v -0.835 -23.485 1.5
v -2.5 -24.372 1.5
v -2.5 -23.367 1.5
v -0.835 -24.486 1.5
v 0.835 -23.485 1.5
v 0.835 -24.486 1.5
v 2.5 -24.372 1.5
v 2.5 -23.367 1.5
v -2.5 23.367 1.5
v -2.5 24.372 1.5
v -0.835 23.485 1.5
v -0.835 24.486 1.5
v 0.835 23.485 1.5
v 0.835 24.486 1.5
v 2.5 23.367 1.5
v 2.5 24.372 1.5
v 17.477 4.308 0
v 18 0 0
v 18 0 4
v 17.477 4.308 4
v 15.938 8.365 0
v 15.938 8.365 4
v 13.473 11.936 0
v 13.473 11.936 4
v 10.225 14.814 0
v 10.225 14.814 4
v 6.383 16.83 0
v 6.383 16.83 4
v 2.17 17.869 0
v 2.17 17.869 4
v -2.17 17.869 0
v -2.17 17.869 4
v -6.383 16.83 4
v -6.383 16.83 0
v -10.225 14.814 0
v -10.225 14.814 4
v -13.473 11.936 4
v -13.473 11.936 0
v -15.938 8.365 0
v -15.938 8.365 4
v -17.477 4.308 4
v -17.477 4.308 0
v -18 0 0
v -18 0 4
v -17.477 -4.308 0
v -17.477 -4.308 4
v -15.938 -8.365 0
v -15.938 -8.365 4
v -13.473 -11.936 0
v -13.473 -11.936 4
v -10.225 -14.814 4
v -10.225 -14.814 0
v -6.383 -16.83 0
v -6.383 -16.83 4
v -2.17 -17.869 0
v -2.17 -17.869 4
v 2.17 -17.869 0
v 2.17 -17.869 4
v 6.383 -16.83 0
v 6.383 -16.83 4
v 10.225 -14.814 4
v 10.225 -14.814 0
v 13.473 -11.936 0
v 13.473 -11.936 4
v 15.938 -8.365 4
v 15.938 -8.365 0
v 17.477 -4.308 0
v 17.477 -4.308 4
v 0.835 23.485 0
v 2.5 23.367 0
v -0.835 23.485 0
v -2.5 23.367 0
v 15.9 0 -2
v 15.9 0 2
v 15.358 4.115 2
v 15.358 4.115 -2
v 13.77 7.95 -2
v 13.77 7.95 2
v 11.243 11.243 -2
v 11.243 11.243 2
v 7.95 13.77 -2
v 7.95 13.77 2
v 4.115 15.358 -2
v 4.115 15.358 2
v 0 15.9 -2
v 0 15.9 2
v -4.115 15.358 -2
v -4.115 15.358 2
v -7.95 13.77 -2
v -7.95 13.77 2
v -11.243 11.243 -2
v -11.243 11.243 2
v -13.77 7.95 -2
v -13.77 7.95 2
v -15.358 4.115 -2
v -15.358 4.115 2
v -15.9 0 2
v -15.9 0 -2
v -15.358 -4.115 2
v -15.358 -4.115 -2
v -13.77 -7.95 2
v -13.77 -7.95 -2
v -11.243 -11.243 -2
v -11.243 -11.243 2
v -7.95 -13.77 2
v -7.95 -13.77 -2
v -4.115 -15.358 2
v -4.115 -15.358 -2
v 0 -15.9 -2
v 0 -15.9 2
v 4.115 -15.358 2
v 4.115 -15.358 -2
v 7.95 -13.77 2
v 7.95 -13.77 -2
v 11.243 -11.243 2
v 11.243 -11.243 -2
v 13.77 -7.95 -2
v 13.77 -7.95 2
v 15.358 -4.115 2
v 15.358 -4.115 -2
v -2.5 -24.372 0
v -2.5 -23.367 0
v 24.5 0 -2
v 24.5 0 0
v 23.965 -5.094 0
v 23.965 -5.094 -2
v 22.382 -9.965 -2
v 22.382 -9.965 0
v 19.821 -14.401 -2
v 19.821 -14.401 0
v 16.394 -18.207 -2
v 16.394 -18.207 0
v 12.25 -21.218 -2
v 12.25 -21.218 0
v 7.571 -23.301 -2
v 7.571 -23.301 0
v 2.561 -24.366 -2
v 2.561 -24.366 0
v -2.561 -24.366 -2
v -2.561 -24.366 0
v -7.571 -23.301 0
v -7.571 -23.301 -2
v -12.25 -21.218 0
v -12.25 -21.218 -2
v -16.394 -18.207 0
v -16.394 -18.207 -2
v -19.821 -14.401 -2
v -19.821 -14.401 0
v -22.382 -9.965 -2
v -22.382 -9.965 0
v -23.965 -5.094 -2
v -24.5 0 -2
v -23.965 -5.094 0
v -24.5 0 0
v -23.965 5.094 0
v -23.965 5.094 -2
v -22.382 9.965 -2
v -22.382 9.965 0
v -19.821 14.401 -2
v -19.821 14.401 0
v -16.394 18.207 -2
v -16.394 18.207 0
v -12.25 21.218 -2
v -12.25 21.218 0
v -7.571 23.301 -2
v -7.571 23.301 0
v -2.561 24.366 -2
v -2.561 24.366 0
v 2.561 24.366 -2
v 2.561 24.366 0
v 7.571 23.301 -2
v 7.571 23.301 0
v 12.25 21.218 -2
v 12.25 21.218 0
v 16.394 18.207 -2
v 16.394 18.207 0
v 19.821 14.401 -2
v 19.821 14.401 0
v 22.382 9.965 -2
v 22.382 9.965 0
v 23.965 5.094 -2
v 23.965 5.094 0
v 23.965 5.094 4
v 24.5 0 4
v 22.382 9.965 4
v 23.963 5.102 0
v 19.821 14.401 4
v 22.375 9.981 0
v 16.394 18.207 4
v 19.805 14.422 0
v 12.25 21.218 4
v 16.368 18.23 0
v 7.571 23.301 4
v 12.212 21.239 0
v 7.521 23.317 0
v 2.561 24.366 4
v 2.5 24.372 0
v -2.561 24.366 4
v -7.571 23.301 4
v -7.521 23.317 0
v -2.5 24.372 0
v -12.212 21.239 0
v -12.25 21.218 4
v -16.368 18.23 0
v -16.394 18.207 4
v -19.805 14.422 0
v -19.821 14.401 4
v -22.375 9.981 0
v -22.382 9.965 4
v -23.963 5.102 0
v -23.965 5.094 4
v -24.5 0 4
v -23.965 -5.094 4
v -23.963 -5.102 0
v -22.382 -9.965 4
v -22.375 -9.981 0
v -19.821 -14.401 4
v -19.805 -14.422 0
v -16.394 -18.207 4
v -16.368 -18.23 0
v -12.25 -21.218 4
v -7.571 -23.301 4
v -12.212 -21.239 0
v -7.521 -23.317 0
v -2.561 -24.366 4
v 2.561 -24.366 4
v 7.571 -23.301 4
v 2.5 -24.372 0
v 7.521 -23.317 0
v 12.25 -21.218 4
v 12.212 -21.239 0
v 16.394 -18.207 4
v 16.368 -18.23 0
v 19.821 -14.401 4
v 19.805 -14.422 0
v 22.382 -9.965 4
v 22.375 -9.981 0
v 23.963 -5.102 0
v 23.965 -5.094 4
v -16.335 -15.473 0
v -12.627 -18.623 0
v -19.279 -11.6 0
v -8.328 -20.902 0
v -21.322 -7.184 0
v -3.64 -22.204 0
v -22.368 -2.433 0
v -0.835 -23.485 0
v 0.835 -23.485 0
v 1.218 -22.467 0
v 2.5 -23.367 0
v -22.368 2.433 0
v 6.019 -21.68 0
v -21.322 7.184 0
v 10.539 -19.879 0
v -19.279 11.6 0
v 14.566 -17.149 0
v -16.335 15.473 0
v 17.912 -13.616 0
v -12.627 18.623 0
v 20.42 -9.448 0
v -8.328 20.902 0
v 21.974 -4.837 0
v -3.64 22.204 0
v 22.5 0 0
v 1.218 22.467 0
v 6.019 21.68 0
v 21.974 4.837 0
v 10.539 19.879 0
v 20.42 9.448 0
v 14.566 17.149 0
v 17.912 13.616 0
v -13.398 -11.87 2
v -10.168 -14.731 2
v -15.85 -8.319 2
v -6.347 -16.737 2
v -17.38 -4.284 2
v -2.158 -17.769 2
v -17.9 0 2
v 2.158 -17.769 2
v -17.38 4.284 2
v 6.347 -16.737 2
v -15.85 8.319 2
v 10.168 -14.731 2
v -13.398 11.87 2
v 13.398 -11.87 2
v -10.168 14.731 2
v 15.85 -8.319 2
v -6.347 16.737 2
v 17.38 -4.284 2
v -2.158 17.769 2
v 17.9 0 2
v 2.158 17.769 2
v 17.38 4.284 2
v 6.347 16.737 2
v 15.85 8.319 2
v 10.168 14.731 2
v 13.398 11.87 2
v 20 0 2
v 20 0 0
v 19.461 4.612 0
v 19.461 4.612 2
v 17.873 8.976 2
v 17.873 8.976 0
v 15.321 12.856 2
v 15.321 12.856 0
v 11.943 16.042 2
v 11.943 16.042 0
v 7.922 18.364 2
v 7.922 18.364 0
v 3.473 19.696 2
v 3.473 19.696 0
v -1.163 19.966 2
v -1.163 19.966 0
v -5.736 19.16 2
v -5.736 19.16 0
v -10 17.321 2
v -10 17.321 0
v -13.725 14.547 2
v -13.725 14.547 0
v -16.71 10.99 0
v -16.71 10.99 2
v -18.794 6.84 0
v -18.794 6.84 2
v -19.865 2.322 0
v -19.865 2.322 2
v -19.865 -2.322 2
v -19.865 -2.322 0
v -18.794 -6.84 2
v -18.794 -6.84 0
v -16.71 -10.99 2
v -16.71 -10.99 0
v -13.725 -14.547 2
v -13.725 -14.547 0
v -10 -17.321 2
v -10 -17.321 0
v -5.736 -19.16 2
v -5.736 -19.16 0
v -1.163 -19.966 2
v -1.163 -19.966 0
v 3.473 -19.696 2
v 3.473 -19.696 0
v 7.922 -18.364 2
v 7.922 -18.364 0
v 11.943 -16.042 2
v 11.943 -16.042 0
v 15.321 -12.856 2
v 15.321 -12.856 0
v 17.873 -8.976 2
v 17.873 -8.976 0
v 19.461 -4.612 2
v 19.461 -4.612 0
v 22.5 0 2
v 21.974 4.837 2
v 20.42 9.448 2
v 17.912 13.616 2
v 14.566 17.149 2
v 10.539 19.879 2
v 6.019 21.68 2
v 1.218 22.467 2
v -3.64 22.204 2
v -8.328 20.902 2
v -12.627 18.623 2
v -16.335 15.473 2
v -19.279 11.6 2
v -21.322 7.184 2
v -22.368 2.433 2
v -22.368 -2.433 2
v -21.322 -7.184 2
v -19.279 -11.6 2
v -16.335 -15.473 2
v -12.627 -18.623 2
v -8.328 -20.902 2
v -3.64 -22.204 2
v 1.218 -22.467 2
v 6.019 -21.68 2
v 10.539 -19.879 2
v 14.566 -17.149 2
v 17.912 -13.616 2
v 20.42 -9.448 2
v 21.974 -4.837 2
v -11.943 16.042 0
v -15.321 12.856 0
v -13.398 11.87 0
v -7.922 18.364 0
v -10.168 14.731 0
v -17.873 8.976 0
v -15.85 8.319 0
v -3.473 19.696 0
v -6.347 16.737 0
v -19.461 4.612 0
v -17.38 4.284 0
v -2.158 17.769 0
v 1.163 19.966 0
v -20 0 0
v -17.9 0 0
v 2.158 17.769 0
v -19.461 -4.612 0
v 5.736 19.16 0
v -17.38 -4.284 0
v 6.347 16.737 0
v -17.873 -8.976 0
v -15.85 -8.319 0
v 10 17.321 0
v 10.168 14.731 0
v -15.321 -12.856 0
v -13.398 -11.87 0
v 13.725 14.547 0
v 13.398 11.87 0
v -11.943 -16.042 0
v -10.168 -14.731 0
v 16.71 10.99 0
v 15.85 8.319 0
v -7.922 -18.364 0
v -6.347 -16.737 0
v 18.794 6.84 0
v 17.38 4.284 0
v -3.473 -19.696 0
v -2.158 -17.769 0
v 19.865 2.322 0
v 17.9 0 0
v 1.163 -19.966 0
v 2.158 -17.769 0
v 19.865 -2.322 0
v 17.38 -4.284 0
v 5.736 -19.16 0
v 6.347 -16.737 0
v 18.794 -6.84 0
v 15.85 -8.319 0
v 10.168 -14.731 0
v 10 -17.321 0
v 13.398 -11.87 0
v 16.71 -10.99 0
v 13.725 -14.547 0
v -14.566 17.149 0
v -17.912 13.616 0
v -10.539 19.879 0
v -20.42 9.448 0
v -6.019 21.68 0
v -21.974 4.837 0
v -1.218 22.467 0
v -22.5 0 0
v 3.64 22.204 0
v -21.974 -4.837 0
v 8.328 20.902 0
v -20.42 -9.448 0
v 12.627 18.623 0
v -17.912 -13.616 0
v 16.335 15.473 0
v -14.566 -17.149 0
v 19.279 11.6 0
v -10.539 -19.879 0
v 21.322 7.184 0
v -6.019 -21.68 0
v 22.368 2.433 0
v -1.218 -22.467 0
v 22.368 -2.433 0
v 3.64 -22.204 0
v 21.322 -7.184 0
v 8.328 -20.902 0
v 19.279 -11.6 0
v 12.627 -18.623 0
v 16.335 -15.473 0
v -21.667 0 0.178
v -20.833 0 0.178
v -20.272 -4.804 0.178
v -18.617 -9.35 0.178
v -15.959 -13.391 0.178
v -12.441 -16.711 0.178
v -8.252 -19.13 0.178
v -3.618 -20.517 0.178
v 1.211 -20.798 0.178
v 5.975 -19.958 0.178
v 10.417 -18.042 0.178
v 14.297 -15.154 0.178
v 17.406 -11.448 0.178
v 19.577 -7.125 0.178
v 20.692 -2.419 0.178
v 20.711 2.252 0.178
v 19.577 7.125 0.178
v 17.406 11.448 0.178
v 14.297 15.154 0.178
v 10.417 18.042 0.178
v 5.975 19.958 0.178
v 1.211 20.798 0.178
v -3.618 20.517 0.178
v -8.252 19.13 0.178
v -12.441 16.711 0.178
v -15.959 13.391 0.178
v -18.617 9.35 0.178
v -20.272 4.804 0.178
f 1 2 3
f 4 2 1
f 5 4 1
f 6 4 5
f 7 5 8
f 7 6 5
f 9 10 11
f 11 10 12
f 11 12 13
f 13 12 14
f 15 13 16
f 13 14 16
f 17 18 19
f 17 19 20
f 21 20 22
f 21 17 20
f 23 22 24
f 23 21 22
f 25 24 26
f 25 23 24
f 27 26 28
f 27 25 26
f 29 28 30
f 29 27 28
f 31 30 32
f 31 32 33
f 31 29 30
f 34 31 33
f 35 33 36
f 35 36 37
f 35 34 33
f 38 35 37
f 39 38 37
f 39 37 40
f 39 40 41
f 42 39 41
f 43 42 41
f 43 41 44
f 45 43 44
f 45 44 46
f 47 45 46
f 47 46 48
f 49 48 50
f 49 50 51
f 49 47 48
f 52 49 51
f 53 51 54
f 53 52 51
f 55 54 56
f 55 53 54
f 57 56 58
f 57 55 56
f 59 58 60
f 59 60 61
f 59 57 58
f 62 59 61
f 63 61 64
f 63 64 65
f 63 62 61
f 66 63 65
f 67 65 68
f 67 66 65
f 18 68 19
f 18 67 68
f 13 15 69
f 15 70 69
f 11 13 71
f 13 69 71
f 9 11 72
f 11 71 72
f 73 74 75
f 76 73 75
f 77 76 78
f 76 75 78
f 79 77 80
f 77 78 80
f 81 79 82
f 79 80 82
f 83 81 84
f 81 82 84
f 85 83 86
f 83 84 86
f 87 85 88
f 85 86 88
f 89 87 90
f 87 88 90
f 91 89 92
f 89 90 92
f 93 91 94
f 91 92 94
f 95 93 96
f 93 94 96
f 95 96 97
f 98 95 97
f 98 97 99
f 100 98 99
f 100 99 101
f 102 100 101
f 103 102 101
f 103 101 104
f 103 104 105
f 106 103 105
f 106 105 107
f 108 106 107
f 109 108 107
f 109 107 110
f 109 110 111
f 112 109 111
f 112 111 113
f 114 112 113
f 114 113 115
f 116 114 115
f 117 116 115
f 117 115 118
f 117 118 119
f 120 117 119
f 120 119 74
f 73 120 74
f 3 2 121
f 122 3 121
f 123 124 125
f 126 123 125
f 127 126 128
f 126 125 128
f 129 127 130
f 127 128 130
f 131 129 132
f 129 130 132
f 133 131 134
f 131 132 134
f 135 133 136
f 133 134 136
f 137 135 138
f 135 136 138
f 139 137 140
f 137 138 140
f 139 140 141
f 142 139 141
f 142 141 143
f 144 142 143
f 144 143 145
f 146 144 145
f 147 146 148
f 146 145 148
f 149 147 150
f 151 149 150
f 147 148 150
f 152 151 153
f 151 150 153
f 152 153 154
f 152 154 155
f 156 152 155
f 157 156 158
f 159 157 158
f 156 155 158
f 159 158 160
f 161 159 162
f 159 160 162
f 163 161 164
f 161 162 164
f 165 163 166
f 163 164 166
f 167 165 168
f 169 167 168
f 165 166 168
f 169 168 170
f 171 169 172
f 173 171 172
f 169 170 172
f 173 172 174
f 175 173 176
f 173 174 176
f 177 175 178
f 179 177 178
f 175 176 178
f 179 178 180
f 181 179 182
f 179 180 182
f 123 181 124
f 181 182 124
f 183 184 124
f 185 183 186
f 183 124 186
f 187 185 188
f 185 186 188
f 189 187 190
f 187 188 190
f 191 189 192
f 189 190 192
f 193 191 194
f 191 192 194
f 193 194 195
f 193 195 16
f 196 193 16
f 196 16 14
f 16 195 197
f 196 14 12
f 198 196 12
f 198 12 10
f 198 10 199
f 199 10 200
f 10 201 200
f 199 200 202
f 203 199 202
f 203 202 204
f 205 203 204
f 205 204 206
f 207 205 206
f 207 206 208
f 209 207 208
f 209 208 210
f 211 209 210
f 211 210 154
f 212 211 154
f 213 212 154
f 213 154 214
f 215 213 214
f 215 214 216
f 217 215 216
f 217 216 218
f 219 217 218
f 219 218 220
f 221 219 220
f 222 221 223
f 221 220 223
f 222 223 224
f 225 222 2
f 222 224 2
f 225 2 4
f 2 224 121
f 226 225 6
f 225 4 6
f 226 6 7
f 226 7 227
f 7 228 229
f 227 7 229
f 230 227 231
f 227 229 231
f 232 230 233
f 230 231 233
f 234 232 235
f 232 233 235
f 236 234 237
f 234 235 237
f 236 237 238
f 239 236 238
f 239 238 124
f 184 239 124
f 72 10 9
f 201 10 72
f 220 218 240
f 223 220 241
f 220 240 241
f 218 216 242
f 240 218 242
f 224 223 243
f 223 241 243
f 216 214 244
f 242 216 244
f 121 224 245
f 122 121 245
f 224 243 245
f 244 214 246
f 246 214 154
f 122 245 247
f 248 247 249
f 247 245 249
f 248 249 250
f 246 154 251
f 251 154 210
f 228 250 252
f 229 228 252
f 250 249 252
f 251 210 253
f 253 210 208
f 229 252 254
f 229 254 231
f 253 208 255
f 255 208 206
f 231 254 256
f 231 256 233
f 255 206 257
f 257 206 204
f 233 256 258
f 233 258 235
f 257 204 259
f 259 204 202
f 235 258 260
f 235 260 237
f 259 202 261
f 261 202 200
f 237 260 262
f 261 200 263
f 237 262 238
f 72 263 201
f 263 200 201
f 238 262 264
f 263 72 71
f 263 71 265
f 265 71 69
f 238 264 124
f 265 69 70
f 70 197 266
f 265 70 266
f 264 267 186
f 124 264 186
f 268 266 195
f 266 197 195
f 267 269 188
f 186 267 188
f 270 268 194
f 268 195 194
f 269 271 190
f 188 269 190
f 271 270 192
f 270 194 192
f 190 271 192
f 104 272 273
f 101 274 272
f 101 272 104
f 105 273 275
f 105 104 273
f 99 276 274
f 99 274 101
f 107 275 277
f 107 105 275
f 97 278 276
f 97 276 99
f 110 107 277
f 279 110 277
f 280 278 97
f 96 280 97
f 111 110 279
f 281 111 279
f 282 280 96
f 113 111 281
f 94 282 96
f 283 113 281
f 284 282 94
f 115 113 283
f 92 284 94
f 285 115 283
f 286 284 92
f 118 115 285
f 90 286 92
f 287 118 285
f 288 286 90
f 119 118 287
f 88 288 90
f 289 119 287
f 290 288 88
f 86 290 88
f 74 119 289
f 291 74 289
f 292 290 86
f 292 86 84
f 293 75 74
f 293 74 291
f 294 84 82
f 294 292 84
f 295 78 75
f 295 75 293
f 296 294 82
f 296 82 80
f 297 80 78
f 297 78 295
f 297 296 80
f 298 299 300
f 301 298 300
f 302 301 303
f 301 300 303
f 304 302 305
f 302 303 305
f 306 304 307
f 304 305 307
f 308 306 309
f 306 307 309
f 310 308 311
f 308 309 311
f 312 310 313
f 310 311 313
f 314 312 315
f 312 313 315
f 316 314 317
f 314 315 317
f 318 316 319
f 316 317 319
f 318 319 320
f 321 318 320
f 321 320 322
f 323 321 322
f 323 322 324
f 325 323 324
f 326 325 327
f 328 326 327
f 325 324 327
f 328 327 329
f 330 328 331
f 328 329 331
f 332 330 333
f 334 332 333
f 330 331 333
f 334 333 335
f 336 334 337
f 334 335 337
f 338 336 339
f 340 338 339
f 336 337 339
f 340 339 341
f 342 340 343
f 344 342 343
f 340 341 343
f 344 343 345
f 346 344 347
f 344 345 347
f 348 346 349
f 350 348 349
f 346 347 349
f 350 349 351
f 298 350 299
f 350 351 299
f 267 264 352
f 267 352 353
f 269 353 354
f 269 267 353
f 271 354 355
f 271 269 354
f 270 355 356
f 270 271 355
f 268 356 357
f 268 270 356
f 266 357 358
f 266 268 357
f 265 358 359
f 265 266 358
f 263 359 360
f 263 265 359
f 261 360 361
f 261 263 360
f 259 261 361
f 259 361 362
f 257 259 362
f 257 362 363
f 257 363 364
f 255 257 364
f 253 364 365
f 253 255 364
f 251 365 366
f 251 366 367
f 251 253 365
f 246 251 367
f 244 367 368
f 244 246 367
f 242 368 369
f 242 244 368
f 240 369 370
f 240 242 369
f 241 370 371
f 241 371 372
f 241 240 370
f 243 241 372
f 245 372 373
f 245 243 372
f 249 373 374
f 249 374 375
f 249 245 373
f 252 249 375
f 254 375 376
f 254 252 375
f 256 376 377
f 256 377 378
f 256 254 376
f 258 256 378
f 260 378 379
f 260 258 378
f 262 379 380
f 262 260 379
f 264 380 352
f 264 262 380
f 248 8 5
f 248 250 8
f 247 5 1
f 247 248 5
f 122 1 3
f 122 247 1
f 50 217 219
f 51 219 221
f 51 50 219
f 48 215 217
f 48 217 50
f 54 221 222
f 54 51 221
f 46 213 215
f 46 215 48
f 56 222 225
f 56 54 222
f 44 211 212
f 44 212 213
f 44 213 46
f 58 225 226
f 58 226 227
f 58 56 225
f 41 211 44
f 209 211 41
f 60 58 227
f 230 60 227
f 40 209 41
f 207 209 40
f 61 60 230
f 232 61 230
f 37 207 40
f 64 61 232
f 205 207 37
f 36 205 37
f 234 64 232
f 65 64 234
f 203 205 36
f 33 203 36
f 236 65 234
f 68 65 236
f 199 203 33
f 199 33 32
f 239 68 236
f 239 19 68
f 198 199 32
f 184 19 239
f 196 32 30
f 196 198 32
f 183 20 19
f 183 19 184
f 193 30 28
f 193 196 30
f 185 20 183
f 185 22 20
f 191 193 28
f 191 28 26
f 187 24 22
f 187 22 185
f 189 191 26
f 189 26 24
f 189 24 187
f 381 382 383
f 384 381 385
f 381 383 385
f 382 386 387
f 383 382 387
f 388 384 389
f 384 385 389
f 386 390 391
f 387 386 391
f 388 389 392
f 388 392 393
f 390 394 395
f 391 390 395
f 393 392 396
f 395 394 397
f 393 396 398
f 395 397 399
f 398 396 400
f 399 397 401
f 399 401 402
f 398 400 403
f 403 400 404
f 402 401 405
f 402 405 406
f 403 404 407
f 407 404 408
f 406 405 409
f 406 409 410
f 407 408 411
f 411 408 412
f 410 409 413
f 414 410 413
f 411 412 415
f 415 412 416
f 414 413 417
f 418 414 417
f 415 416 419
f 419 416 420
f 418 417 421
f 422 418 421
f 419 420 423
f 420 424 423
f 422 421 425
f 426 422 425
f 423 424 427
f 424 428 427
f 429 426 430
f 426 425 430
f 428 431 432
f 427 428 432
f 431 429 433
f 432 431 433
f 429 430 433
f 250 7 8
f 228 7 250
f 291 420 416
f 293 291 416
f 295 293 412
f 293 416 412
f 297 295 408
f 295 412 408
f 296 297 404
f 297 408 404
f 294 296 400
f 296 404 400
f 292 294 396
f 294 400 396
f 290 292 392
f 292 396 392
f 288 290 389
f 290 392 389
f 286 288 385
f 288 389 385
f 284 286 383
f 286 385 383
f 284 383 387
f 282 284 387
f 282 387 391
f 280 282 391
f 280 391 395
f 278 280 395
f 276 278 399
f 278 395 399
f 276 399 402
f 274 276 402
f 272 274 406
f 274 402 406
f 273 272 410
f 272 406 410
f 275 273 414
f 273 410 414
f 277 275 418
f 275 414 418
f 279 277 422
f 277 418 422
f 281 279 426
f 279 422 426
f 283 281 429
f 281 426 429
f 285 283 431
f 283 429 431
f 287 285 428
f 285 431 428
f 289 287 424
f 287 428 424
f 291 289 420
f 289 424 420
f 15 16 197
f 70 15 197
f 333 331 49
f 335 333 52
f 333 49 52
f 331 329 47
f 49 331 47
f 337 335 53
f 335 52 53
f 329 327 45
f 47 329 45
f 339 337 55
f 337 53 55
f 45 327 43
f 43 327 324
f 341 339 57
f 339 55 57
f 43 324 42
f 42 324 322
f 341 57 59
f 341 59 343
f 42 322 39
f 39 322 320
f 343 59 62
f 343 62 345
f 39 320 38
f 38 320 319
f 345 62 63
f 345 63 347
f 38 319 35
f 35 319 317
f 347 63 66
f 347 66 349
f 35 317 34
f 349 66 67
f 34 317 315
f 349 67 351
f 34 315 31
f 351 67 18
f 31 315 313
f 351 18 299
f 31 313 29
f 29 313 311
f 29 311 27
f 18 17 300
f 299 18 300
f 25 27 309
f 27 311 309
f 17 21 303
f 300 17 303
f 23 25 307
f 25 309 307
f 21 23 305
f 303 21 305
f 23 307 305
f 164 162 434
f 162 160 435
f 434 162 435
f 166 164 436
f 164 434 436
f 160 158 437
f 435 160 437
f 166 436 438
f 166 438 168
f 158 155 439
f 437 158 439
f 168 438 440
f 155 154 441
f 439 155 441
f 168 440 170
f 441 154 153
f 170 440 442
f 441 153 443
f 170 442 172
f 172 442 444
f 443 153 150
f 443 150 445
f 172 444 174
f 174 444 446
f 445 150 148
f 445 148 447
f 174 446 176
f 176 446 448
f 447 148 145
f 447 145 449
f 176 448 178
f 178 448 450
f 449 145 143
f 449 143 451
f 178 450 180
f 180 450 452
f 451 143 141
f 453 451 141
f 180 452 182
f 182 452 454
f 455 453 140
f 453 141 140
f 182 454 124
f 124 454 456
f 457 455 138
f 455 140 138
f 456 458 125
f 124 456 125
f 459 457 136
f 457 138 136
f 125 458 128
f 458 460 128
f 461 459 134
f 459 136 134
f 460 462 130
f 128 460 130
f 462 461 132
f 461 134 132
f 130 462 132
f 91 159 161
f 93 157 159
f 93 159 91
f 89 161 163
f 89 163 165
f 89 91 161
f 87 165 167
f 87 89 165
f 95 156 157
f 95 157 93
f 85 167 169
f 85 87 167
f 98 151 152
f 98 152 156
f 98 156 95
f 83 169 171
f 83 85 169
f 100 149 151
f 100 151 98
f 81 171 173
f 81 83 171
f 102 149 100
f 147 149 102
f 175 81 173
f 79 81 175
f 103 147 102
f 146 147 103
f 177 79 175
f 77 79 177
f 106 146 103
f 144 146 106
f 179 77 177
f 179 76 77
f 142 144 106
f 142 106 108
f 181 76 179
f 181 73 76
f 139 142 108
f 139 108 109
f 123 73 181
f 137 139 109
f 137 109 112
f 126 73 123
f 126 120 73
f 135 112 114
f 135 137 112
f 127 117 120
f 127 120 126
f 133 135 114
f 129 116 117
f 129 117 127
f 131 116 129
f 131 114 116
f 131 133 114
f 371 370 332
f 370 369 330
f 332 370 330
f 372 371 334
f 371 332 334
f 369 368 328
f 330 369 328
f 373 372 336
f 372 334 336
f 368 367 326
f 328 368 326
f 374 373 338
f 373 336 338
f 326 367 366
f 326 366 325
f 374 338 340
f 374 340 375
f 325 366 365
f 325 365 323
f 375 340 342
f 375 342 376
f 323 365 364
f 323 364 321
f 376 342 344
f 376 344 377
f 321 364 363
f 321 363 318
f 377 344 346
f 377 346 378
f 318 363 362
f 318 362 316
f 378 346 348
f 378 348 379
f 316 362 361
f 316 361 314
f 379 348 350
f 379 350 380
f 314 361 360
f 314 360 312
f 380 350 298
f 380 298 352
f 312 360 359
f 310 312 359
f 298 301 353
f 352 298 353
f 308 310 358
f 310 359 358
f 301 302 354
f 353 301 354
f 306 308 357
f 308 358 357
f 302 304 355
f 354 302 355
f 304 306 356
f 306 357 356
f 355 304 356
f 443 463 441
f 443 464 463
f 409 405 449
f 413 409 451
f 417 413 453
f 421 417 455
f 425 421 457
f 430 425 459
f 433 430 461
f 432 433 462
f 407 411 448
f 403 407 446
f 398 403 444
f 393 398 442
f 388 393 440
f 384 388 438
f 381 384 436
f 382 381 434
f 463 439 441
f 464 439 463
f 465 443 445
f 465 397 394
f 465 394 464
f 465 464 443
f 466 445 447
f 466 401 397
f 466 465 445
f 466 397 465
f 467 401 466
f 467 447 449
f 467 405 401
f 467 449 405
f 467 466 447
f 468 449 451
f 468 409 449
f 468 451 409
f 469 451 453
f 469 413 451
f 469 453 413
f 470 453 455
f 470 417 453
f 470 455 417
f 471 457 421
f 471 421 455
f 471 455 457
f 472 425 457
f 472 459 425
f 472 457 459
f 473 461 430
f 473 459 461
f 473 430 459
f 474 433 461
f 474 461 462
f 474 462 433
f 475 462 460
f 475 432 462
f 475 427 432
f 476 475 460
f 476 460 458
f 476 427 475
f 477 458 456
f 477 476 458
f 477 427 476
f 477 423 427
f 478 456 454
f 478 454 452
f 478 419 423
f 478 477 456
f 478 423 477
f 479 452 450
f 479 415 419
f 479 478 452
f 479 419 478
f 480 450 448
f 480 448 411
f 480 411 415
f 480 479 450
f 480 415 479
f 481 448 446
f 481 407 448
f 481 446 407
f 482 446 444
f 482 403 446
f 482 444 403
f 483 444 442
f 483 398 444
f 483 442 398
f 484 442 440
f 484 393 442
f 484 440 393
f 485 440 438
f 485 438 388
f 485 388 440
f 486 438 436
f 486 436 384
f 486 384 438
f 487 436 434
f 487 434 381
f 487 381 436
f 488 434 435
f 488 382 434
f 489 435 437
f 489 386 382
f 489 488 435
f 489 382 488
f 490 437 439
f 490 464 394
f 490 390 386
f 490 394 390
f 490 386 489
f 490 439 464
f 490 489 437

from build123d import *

# Parameters (mm, degrees)
SKETCH1_R               = 24.5
SKETCH1_R_2             = 18
BOSS_EXTRUDE1_DEPTH     = 4
SKETCH3_R               = 22.5
SKETCH3_R_2             = 20
CUT_EXTRUDE1_DEPTH      = 2
SKETCH4_R               = 24.5
BOSS_EXTRUDE2_DEPTH     = 2
SKETCH5_R               = 17.9
BOSS_EXTRUDE3_DEPTH     = 2
SKETCH8_R               = 15.9
CUT_EXTRUDE2_DEPTH      = 35.878360053
CUT_EXTRUDE3_REACH      = 136.878
CUT_EXTRUDE3_END_RADIUS = 23.5
CUT_EXTRUDE3_START      = -100
SKETCH9_W               = 2.5
SKETCH9_H               = 1.5


with BuildPart() as part:
    # Sketch1 → Boss-Extrude1 (new body)
    with BuildSketch(Plane.XY):
        Circle(SKETCH1_R)
        Circle(SKETCH1_R_2, mode=Mode.SUBTRACT)
    extrude(amount=BOSS_EXTRUDE1_DEPTH)

    # Sketch3 → Cut-Extrude1 (cut)
    with BuildSketch(Plane.XY):
        Circle(SKETCH3_R)
        Circle(SKETCH3_R_2, mode=Mode.SUBTRACT)
    extrude(amount=CUT_EXTRUDE1_DEPTH, mode=Mode.SUBTRACT)

    # Cut-Extrude3: up to this cylinder (the profile starts outside it)
    cut_extrude3_end = Plane(origin=(0, 0, 0.75), z_dir=(0, 0, -1)) * Cylinder(CUT_EXTRUDE3_END_RADIUS, 321.756, mode=Mode.PRIVATE)
    # Sketch9 → Cut-Extrude3 (cut, up to the surface)
    with BuildSketch(Plane(origin=(0, 0, 0), x_dir=(1, 0, 0), z_dir=(0, 1, 0)).offset(CUT_EXTRUDE3_START), mode=Mode.PRIVATE) as cut_extrude3_sk1:
        with Locations((-1.25, -0.75)):
            Rectangle(SKETCH9_W, SKETCH9_H)
    cut_extrude3_tool1 = extrude(cut_extrude3_sk1.sketch, amount=CUT_EXTRUDE3_REACH, mode=Mode.PRIVATE) - cut_extrude3_end
    # Sketch9 → Cut-Extrude3 (cut, up to the surface)
    with BuildSketch(Plane(origin=(0, 0, 0), x_dir=(1, 0, 0), z_dir=(0, 1, 0)).offset(CUT_EXTRUDE3_START), mode=Mode.PRIVATE) as cut_extrude3_sk2:
        with Locations((1.25, -0.75)):
            Rectangle(SKETCH9_W, SKETCH9_H)
    cut_extrude3_tool2 = extrude(cut_extrude3_sk2.sketch, amount=CUT_EXTRUDE3_REACH, mode=Mode.PRIVATE) - cut_extrude3_end
    cut_extrude3 = cut_extrude3_tool1.solids().sort_by_distance((-1.25, -100, 0.75))[0] + cut_extrude3_tool2.solids().sort_by_distance((1.25, -100, 0.75))[0]
    add(cut_extrude3, mode=Mode.SUBTRACT)

    # Mirror1: Cut-Extrude3 across plane
    add(cut_extrude3.mirror(Plane.ZX), mode=Mode.SUBTRACT)


with BuildPart() as body_2:
    # Sketch4 → Boss-Extrude2 (new body)
    with BuildSketch(Plane(origin=(0, 0, 0), x_dir=(-1, 0, 0), z_dir=(0, 0, -1))):
        with Locations(Location((0, 0, 0), (0, 0, 180))):
            Circle(SKETCH4_R)
    extrude(amount=BOSS_EXTRUDE2_DEPTH)


with BuildPart() as body_3:
    # Sketch5 → Boss-Extrude3 (new body)
    with BuildSketch(Plane.XY):
        Circle(SKETCH5_R)
    extrude(amount=BOSS_EXTRUDE3_DEPTH)


with BuildPart() as body_2_1:
    add(body_2.part)

    # Combine1: union body 3
    add(body_3.part)

    # Sketch8 → Cut-Extrude2 (cut, through all)
    with BuildSketch(Plane.XY.offset(2)):
        Circle(SKETCH8_R)
    extrude(amount=-CUT_EXTRUDE2_DEPTH, mode=Mode.SUBTRACT)


with BuildPart() as body_3_2:
    # Sketch6 → Revolve1 (revolve)
    with BuildSketch(Plane(origin=(0, 0, 0), x_dir=(1, 0, 0), z_dir=(0, 1, 0))):
        with BuildLine():
            Line((-22.5, 0), (-20, 0))
            add(Edge.make_bspline(
                [(-22.5, 0), (-21.25, -0.4), (-20, 0)],
                knots=[0, 0, 0, 1, 1, 1], degree=2))
        make_face()
    revolve(axis=Axis((0, 0, -2), (0, 0, 1)))


with BuildPart() as body_2_2:
    add(body_2_1.part)

    # Combine3: union body 3 2
    add(body_3_2.part)


solid = Compound([part.part, body_2_2.part])
